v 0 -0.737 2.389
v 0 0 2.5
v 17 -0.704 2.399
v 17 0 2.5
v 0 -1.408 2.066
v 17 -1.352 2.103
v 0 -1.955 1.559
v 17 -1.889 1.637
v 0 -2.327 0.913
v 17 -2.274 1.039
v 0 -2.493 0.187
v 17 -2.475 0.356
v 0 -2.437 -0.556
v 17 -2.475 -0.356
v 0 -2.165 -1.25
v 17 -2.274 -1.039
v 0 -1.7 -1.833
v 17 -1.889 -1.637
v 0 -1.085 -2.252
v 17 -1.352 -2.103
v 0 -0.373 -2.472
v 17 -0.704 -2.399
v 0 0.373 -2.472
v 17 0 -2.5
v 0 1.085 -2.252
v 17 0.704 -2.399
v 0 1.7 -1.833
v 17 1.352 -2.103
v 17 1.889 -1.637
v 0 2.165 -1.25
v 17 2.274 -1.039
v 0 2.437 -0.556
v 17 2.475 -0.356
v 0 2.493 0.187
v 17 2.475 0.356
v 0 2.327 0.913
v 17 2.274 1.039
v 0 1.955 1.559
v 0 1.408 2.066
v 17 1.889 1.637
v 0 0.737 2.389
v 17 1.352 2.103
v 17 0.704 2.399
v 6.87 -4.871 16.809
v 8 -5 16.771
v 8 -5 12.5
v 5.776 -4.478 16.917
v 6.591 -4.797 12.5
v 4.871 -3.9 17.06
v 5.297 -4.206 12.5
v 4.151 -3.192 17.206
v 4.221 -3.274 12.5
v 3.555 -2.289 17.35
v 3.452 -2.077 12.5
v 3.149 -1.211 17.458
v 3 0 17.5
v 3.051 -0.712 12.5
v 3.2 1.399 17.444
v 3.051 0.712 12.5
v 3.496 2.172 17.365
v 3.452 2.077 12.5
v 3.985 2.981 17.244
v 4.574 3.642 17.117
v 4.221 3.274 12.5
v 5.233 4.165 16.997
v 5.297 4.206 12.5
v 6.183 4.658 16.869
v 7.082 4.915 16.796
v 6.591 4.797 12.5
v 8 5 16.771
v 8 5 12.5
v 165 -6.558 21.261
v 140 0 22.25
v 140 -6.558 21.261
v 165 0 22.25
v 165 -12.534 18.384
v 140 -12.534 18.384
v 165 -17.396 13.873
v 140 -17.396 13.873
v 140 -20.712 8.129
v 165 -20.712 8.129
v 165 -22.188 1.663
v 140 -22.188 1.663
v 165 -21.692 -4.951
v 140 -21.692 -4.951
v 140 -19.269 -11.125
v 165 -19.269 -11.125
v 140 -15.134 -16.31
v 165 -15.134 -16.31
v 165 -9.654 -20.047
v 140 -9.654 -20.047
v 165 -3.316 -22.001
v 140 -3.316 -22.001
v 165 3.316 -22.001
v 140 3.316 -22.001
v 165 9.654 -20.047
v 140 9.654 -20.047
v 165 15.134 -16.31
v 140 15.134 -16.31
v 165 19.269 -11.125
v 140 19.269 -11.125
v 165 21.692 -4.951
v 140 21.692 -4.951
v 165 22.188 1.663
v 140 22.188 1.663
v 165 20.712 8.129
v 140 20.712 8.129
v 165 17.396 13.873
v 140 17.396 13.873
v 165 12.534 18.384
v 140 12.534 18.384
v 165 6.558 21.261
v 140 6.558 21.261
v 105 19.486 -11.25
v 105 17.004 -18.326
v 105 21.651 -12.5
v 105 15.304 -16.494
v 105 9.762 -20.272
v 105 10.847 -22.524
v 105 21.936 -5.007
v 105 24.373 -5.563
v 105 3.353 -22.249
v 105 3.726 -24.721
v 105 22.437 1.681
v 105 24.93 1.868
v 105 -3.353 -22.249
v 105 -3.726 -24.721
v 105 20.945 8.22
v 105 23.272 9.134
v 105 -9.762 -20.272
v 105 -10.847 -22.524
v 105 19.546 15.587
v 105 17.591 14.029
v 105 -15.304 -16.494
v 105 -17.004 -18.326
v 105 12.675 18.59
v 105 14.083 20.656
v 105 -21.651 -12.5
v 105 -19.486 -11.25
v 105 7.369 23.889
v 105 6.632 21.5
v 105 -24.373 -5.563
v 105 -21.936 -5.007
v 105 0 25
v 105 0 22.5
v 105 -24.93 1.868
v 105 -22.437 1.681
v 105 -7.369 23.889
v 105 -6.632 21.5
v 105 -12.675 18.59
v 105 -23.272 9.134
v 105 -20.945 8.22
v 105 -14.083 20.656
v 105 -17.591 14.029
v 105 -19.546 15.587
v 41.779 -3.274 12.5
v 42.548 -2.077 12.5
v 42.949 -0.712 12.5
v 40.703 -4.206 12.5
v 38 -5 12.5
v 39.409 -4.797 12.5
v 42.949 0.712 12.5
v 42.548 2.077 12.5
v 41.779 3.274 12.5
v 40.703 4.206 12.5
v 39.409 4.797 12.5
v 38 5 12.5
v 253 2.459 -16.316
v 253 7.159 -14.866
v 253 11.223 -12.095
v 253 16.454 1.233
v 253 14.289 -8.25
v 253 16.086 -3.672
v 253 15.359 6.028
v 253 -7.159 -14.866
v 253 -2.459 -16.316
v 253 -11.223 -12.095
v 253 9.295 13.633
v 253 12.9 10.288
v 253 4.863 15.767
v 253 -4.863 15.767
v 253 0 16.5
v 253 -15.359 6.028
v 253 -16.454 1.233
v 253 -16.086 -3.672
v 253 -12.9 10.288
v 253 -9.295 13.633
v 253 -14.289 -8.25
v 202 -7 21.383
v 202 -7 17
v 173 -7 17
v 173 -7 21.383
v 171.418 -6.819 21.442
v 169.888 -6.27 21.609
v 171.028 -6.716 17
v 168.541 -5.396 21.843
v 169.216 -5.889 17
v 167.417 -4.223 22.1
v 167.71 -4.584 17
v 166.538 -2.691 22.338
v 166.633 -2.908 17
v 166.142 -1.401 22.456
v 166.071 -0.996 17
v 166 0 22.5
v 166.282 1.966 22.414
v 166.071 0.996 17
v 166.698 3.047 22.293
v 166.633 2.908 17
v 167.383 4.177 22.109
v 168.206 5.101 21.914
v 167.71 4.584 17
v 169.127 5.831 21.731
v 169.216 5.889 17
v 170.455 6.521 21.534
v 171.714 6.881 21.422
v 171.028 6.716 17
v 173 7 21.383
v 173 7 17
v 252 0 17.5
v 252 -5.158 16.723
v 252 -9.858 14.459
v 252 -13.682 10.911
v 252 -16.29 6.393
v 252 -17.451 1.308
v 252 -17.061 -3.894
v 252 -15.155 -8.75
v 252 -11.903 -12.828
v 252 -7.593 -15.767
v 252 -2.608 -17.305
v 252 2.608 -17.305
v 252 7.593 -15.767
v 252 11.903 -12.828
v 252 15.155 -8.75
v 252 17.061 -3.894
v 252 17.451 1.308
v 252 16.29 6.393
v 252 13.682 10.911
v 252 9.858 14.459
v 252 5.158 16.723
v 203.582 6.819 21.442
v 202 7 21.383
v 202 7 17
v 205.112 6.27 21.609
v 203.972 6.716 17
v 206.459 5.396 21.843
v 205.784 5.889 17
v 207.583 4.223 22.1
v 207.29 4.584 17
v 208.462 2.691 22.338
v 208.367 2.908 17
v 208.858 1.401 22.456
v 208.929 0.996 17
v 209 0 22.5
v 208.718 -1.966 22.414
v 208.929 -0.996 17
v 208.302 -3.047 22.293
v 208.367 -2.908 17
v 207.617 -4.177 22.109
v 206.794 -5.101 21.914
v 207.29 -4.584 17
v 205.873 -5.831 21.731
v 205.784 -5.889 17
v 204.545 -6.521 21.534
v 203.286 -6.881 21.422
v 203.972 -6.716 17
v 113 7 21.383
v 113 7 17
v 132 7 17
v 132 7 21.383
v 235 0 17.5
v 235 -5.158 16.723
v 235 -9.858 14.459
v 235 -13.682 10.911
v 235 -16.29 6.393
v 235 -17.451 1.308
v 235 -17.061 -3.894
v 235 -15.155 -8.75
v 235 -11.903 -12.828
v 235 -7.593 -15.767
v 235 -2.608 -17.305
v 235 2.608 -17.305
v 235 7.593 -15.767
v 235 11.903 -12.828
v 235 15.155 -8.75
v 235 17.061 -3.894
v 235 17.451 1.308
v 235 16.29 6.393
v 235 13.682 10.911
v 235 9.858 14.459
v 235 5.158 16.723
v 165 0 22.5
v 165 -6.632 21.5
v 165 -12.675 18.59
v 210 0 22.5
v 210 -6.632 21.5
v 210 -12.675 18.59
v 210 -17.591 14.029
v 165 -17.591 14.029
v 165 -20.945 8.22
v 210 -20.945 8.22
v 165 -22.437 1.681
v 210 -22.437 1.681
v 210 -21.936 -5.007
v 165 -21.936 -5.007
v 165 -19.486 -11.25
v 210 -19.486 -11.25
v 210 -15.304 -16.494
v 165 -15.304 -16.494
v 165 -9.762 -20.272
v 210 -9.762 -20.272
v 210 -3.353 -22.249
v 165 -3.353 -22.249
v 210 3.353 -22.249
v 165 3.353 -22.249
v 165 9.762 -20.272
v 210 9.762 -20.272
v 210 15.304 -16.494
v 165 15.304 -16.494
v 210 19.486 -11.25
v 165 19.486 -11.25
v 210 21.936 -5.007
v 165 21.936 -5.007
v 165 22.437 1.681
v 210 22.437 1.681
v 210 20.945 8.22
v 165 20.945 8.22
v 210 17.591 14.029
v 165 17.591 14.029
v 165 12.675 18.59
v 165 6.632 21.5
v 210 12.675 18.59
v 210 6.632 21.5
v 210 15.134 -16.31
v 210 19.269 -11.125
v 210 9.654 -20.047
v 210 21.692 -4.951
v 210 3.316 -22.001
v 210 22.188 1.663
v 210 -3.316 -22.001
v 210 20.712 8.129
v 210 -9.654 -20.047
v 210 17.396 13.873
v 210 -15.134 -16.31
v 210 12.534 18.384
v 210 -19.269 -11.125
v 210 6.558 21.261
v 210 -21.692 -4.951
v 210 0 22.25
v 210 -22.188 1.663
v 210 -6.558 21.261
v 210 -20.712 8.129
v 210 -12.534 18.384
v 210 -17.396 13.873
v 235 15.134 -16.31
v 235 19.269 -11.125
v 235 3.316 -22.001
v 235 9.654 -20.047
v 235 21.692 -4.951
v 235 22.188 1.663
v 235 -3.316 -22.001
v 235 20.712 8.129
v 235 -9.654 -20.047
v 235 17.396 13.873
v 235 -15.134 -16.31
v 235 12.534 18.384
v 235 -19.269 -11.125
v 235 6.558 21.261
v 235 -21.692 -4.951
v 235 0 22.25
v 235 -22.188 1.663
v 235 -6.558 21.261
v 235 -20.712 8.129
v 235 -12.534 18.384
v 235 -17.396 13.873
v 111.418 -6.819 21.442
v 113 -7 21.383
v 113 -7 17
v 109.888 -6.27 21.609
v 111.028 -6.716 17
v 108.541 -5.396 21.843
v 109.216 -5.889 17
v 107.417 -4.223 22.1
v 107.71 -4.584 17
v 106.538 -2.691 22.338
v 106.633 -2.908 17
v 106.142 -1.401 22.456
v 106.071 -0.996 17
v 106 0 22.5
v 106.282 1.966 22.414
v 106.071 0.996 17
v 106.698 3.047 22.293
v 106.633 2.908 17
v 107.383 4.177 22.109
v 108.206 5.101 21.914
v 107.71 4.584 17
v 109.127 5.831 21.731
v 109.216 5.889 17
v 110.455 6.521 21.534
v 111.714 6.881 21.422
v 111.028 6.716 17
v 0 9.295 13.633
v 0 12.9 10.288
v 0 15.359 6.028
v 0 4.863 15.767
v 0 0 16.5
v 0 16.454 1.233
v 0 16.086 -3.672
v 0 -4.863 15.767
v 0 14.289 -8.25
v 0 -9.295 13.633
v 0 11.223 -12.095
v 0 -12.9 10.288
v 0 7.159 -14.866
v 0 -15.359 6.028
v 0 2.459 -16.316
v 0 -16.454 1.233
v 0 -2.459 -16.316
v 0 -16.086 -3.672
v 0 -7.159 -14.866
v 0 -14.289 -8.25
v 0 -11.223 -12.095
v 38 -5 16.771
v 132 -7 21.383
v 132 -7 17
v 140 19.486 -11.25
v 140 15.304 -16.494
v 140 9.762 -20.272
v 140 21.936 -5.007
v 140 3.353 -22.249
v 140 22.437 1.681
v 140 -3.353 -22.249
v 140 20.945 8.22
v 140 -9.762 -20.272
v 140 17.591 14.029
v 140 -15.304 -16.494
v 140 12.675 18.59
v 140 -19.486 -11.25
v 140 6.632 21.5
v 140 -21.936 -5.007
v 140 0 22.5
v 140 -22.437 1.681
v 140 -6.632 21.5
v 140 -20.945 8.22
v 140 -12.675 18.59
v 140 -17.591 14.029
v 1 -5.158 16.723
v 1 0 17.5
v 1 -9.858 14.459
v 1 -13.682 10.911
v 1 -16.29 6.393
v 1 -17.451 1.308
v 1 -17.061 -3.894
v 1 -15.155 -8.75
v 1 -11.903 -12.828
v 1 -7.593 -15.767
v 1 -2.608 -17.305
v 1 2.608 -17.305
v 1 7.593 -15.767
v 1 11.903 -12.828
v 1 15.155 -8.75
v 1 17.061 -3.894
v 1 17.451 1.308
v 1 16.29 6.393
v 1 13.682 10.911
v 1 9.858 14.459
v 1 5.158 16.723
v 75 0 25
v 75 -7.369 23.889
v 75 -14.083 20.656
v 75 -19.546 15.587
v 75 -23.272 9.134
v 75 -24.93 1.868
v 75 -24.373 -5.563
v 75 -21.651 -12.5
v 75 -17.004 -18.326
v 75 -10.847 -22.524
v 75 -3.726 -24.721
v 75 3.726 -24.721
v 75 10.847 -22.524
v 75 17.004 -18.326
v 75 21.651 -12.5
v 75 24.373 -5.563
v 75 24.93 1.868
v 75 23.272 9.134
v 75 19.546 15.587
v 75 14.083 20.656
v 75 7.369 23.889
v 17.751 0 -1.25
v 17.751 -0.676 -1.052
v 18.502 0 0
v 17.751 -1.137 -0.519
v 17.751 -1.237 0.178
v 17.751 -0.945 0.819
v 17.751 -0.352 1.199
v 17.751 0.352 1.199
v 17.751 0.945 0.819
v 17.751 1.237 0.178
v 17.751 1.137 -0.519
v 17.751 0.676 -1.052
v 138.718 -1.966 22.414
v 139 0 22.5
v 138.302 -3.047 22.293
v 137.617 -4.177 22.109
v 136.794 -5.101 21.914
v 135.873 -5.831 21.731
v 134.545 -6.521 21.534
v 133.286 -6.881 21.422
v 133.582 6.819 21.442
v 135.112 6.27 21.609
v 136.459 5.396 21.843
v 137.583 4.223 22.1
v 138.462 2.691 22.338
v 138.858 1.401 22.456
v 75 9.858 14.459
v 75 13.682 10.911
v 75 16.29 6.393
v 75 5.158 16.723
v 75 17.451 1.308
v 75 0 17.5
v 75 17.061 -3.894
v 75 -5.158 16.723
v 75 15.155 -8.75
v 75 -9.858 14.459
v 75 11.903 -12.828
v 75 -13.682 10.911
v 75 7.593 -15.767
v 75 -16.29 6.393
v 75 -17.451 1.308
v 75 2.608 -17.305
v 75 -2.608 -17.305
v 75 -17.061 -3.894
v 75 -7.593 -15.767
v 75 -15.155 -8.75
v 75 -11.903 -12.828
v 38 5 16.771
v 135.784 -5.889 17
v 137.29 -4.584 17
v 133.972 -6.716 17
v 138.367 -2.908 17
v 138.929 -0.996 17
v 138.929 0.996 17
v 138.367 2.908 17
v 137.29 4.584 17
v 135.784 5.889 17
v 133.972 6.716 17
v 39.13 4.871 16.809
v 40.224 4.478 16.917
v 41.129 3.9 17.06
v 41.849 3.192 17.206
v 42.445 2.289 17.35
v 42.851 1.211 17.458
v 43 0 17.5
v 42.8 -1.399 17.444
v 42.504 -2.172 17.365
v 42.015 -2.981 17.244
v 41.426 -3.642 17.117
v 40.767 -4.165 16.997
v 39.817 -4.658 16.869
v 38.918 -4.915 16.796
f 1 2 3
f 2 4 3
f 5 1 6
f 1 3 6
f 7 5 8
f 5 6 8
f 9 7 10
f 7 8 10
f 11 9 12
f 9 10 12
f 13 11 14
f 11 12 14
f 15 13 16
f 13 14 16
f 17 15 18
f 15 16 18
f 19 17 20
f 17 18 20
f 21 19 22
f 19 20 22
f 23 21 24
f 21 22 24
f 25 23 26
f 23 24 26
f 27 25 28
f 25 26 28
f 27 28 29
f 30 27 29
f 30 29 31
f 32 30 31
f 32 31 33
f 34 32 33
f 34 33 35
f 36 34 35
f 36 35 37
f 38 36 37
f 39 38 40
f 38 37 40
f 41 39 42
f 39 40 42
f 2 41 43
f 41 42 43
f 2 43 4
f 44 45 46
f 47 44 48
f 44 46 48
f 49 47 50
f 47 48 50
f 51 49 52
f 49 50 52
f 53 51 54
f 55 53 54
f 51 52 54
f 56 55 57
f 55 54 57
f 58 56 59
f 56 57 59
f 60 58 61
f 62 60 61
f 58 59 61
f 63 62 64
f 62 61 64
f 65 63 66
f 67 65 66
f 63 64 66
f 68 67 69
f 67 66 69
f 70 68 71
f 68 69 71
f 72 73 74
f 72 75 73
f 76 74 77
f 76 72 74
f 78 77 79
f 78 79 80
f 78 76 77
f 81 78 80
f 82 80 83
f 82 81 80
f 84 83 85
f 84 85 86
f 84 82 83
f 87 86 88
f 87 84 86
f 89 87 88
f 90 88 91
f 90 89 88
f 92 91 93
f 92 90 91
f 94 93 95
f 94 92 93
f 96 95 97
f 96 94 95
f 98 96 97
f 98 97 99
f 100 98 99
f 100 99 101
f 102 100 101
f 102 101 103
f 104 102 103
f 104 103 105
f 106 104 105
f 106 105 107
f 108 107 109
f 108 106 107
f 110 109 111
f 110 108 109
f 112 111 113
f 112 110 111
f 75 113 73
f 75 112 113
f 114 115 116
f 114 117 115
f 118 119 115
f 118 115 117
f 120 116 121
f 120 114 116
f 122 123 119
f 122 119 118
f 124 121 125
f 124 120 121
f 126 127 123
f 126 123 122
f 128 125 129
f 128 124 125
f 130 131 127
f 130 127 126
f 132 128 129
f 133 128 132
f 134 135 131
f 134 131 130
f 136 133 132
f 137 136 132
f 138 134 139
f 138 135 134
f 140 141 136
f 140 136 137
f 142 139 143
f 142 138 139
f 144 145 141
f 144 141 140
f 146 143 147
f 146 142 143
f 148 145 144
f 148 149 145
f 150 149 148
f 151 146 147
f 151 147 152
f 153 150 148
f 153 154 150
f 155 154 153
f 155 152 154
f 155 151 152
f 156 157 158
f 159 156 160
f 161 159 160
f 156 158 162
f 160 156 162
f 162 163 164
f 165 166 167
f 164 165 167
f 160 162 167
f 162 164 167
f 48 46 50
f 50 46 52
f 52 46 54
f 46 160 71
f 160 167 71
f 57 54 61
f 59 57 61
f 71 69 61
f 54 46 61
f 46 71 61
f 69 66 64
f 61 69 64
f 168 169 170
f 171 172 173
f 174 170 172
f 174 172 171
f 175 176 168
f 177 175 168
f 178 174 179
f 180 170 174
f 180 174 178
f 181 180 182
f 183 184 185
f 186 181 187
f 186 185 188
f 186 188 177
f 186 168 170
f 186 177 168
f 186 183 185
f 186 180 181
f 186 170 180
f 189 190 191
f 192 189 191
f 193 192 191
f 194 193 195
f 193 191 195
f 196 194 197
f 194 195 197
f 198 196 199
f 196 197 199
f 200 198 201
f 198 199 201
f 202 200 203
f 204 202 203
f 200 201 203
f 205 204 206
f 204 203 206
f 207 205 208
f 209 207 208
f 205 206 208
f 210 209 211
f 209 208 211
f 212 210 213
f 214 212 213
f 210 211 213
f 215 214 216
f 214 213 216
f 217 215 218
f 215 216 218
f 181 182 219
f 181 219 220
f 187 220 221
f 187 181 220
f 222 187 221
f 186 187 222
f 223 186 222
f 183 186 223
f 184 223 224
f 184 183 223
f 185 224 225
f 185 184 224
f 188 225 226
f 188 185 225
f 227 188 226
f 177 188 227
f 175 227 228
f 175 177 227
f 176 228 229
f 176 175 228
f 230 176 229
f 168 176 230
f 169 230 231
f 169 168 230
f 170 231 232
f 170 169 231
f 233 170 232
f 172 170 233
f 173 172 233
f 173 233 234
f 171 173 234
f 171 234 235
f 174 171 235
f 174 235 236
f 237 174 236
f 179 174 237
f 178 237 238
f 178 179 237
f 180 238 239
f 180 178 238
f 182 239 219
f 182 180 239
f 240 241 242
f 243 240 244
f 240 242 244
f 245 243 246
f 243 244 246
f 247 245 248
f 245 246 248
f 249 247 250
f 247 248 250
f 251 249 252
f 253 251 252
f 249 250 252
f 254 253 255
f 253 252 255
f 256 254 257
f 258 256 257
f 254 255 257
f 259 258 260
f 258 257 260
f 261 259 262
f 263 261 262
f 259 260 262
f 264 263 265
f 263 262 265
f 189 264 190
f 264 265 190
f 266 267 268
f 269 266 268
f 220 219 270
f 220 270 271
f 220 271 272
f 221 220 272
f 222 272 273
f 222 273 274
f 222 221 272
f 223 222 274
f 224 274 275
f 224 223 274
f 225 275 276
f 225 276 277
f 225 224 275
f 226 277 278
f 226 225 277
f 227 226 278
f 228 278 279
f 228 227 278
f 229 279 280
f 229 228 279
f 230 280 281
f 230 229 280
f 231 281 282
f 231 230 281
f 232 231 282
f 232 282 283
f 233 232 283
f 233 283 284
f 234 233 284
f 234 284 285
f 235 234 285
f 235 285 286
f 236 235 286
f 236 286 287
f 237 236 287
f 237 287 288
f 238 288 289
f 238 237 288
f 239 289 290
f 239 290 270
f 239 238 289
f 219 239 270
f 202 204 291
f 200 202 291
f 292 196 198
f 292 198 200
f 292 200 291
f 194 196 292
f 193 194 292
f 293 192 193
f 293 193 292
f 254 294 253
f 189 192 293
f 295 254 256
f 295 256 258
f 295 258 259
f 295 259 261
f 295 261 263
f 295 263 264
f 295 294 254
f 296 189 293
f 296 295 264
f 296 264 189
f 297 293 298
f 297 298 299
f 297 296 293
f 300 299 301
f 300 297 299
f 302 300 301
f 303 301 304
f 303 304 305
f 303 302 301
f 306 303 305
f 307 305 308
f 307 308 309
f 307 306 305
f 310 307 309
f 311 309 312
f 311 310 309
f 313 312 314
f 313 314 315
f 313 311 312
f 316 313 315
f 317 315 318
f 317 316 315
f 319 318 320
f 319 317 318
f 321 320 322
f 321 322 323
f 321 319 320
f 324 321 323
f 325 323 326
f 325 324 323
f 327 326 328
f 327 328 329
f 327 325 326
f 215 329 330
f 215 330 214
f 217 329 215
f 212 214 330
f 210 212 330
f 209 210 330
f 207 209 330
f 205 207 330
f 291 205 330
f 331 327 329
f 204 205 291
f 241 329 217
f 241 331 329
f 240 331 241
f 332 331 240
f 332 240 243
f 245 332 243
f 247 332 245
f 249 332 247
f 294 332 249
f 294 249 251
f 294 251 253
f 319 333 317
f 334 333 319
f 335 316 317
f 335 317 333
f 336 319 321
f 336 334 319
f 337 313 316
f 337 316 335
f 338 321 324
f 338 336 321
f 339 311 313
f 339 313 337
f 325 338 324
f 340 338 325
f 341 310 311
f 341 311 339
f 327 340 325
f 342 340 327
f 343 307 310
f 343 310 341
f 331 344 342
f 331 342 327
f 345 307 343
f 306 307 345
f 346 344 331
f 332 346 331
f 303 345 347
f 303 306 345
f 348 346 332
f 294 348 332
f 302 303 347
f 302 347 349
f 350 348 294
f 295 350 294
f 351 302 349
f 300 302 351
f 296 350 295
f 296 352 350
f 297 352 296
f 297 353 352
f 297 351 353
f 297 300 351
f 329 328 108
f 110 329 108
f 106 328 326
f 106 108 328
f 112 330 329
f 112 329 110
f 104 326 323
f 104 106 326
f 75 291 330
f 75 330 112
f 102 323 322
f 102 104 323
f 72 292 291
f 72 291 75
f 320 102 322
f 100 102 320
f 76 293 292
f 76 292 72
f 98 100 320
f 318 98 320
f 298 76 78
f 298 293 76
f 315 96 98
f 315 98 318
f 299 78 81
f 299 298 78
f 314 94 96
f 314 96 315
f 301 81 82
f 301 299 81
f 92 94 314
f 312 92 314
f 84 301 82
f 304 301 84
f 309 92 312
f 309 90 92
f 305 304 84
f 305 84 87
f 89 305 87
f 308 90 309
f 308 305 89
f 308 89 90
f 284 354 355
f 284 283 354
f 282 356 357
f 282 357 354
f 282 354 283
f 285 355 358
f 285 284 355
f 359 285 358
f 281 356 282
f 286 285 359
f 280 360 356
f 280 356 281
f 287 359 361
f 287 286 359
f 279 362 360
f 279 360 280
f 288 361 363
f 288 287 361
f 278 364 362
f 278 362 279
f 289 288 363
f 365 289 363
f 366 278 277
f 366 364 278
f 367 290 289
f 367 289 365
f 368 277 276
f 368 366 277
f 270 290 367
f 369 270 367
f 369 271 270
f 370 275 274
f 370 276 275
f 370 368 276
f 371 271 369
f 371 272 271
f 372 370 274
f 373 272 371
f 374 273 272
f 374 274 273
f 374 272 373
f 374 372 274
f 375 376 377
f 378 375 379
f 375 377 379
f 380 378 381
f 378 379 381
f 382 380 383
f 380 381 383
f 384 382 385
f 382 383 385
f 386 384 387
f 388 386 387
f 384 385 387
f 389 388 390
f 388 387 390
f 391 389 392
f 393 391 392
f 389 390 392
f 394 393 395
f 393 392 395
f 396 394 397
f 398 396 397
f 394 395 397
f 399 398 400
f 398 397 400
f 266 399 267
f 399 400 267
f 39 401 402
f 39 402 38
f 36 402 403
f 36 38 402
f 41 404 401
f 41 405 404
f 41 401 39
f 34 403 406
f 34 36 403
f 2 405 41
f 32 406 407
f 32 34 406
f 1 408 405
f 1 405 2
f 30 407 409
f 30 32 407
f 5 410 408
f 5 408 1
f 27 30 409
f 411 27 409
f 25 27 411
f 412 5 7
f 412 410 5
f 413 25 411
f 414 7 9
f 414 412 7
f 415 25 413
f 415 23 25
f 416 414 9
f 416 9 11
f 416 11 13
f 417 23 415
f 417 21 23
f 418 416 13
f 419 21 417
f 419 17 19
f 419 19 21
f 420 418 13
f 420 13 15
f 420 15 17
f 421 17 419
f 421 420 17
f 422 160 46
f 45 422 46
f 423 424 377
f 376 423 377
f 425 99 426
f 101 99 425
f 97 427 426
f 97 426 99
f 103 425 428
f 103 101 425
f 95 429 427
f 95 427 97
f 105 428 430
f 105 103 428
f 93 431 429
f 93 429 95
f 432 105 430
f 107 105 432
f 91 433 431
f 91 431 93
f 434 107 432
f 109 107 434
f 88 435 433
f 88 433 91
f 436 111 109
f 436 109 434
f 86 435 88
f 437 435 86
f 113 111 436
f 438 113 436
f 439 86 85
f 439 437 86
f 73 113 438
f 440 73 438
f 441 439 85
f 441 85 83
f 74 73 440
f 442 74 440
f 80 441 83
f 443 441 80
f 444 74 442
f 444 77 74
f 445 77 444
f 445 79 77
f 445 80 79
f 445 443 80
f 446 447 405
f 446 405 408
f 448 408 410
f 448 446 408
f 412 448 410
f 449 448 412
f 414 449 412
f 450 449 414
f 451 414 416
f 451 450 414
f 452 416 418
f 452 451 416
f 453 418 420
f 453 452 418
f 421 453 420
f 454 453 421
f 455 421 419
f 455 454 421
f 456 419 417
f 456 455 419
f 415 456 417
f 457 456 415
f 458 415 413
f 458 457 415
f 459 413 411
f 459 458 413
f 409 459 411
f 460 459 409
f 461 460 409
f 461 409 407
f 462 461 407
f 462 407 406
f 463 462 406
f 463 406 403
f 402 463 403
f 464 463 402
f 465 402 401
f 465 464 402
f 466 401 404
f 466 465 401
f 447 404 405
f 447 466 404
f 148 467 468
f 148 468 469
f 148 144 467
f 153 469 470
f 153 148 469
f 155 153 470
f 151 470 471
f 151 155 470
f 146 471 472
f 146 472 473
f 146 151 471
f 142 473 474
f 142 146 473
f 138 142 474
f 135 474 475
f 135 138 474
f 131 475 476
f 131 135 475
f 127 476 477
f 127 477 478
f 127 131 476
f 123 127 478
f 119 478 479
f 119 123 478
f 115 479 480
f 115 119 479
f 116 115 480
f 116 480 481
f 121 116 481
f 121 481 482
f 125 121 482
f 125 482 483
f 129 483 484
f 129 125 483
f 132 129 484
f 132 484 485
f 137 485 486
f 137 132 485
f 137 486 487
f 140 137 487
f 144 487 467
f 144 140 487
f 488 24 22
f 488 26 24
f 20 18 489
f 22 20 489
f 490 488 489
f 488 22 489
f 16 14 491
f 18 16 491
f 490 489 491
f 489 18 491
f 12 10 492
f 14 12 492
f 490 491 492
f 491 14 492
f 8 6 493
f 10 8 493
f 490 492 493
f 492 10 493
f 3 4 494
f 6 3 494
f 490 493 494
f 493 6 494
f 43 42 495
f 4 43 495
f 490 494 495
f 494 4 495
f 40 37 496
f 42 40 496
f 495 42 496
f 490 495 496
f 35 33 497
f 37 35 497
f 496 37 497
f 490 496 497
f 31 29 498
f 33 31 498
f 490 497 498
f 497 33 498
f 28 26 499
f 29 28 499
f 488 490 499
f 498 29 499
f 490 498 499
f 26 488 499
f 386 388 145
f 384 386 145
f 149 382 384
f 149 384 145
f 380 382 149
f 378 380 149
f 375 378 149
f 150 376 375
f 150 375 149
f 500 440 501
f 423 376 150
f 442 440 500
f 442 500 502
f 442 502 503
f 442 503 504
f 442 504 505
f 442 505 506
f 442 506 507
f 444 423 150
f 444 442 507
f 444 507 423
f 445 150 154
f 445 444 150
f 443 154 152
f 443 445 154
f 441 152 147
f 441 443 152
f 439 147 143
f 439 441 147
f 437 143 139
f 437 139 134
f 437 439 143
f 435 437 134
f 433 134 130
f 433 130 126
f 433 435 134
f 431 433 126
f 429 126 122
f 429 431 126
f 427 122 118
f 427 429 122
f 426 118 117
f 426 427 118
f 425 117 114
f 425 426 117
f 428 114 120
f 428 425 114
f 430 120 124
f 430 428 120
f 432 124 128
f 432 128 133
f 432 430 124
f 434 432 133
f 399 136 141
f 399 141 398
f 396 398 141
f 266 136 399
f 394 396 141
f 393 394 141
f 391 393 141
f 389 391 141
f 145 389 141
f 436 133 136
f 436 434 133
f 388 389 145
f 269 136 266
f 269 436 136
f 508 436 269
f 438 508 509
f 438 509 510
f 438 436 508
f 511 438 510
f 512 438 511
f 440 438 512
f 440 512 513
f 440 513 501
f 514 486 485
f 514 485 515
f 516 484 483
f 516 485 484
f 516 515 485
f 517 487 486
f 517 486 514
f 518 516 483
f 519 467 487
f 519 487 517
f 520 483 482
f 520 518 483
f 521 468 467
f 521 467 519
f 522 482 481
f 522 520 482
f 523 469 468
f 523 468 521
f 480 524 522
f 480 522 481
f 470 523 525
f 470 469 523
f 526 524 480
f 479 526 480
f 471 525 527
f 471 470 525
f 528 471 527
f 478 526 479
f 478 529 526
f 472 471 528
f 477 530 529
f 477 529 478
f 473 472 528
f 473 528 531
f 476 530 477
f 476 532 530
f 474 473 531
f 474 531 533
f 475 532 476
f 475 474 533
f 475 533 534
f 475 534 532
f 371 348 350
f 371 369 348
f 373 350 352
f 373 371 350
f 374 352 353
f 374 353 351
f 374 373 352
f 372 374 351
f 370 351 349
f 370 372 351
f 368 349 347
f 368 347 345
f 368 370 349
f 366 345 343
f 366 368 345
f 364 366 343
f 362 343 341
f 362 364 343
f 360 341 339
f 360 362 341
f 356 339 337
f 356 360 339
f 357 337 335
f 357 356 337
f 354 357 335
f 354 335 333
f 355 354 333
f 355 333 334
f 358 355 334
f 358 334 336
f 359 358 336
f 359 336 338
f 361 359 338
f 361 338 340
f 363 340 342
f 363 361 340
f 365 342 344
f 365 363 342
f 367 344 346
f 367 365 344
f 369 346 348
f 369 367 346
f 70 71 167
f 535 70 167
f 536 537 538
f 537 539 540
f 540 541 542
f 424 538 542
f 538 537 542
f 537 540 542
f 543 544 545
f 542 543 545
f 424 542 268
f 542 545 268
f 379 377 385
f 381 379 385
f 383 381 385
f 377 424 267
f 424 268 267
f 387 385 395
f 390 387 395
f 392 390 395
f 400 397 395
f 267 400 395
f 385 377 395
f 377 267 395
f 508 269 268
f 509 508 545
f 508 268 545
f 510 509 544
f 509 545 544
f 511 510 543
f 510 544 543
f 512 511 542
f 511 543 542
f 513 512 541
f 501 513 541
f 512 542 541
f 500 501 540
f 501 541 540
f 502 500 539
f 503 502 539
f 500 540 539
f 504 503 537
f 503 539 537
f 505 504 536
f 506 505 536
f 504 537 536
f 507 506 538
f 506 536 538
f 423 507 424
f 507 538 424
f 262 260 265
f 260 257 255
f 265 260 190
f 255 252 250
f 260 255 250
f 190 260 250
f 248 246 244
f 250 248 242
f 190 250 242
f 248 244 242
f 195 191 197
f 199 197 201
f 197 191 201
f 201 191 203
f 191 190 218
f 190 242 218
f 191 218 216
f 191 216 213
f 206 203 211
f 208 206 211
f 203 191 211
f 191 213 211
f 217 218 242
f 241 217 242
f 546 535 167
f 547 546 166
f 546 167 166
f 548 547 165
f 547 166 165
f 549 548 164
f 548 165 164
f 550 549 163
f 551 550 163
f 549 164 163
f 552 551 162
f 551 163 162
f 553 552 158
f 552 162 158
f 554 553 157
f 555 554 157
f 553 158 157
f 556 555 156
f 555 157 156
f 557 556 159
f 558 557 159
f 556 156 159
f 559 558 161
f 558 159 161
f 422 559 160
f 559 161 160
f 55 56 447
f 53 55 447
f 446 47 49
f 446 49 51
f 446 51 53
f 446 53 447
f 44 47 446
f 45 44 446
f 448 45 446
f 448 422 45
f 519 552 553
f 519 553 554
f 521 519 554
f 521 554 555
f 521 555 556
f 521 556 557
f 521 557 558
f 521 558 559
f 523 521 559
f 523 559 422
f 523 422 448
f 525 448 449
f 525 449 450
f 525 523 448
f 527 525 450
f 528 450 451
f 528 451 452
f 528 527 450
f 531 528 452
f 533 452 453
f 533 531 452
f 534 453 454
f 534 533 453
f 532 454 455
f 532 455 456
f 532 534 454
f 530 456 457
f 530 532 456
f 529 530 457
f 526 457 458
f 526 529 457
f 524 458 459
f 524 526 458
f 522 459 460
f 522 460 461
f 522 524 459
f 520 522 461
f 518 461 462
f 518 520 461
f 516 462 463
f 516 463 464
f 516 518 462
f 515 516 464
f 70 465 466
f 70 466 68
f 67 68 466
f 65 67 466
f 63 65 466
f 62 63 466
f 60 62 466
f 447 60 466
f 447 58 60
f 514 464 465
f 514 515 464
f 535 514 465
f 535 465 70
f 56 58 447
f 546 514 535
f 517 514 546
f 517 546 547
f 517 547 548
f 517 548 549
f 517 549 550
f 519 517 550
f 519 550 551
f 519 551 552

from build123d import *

# Parameters (mm, degrees)
HOLE_WIZARD_M6_1_D     = 5
HOLE_WIZARD_M6_1_DEPTH = 17
HOLE_WIZARD_M6_1_TIP   = 1.502151548
CUT_EXTRUDE_1_DEPTH    = 10
CUT_EXTRUDE_2_DEPTH    = 10
CHAMFER_1_SIZE         = 1


with BuildPart() as part:
    # 草图1 → 旋转1 (revolve)
    with BuildSketch(Plane.XY, mode=Mode.PRIVATE) as revolve_1_sk:
        Polygon((0, 0), (0, 17.5), (75, 17.5), (75, 25), (105, 25), (105, 22.5), (140, 22.5), (140, 22.25), (165, 22.25), (165, 22.5), (210, 22.5), (210, 22.25), (235, 22.25), (235, 17.5), (253, 17.5), (253, 0), align=None)
    revolve(revolve_1_sk.sketch.rotate(Axis((0, 0, 0), (1, 0, 0)), 90), axis=Axis((0, 0, 0), (1, 0, 0)))

    # M6 螺纹孔1
    with Locations(Plane(origin=(0, 0, 0), x_dir=(0, 0, -1), z_dir=(-1, 0, 0))):
        with Locations((0, 0)):
            Hole(HOLE_WIZARD_M6_1_D / 2, depth=HOLE_WIZARD_M6_1_DEPTH)
            with Locations((0, 0, -(HOLE_WIZARD_M6_1_DEPTH + HOLE_WIZARD_M6_1_TIP / 2))):  # 118° drill point
                Cone(0, HOLE_WIZARD_M6_1_D / 2, HOLE_WIZARD_M6_1_TIP, mode=Mode.SUBTRACT)

    # 草图4 → 切除-拉伸1 (cut)
    with BuildSketch(Plane.XY.offset(17)):
        with BuildLine():
            Line((113, 7), (132, 7))
            ThreePointArc((132, 7), (139, 0), (132, -7))
            Line((132, -7), (113, -7))
            ThreePointArc((113, -7), (106, 0), (113, 7))
        make_face()
        with BuildLine():
            Line((173, 7), (202, 7))
            ThreePointArc((202, 7), (209, 0), (202, -7))
            Line((202, -7), (173, -7))
            ThreePointArc((173, -7), (166, 0), (173, 7))
        make_face()
    extrude(amount=CUT_EXTRUDE_1_DEPTH, mode=Mode.SUBTRACT)

    # 草图5 → 切除-拉伸2 (cut)
    with BuildSketch(Plane.XY.offset(12.5)):
        with BuildLine():
            Line((8, 5), (38, 5))
            ThreePointArc((38, 5), (43, 0), (38, -5))
            Line((38, -5), (8, -5))
            ThreePointArc((8, -5), (3, 0), (8, 5))
        make_face()
    extrude(amount=CUT_EXTRUDE_2_DEPTH, mode=Mode.SUBTRACT)

    # 倒角1
    chamfer_1_edges = [part.edges().sort_by_distance(p)[0] for p in [
        (253, 0, -17.5),
        (0, 0, -17.5),
    ]]
    chamfer(chamfer_1_edges, length=CHAMFER_1_SIZE)


solid = part.part
